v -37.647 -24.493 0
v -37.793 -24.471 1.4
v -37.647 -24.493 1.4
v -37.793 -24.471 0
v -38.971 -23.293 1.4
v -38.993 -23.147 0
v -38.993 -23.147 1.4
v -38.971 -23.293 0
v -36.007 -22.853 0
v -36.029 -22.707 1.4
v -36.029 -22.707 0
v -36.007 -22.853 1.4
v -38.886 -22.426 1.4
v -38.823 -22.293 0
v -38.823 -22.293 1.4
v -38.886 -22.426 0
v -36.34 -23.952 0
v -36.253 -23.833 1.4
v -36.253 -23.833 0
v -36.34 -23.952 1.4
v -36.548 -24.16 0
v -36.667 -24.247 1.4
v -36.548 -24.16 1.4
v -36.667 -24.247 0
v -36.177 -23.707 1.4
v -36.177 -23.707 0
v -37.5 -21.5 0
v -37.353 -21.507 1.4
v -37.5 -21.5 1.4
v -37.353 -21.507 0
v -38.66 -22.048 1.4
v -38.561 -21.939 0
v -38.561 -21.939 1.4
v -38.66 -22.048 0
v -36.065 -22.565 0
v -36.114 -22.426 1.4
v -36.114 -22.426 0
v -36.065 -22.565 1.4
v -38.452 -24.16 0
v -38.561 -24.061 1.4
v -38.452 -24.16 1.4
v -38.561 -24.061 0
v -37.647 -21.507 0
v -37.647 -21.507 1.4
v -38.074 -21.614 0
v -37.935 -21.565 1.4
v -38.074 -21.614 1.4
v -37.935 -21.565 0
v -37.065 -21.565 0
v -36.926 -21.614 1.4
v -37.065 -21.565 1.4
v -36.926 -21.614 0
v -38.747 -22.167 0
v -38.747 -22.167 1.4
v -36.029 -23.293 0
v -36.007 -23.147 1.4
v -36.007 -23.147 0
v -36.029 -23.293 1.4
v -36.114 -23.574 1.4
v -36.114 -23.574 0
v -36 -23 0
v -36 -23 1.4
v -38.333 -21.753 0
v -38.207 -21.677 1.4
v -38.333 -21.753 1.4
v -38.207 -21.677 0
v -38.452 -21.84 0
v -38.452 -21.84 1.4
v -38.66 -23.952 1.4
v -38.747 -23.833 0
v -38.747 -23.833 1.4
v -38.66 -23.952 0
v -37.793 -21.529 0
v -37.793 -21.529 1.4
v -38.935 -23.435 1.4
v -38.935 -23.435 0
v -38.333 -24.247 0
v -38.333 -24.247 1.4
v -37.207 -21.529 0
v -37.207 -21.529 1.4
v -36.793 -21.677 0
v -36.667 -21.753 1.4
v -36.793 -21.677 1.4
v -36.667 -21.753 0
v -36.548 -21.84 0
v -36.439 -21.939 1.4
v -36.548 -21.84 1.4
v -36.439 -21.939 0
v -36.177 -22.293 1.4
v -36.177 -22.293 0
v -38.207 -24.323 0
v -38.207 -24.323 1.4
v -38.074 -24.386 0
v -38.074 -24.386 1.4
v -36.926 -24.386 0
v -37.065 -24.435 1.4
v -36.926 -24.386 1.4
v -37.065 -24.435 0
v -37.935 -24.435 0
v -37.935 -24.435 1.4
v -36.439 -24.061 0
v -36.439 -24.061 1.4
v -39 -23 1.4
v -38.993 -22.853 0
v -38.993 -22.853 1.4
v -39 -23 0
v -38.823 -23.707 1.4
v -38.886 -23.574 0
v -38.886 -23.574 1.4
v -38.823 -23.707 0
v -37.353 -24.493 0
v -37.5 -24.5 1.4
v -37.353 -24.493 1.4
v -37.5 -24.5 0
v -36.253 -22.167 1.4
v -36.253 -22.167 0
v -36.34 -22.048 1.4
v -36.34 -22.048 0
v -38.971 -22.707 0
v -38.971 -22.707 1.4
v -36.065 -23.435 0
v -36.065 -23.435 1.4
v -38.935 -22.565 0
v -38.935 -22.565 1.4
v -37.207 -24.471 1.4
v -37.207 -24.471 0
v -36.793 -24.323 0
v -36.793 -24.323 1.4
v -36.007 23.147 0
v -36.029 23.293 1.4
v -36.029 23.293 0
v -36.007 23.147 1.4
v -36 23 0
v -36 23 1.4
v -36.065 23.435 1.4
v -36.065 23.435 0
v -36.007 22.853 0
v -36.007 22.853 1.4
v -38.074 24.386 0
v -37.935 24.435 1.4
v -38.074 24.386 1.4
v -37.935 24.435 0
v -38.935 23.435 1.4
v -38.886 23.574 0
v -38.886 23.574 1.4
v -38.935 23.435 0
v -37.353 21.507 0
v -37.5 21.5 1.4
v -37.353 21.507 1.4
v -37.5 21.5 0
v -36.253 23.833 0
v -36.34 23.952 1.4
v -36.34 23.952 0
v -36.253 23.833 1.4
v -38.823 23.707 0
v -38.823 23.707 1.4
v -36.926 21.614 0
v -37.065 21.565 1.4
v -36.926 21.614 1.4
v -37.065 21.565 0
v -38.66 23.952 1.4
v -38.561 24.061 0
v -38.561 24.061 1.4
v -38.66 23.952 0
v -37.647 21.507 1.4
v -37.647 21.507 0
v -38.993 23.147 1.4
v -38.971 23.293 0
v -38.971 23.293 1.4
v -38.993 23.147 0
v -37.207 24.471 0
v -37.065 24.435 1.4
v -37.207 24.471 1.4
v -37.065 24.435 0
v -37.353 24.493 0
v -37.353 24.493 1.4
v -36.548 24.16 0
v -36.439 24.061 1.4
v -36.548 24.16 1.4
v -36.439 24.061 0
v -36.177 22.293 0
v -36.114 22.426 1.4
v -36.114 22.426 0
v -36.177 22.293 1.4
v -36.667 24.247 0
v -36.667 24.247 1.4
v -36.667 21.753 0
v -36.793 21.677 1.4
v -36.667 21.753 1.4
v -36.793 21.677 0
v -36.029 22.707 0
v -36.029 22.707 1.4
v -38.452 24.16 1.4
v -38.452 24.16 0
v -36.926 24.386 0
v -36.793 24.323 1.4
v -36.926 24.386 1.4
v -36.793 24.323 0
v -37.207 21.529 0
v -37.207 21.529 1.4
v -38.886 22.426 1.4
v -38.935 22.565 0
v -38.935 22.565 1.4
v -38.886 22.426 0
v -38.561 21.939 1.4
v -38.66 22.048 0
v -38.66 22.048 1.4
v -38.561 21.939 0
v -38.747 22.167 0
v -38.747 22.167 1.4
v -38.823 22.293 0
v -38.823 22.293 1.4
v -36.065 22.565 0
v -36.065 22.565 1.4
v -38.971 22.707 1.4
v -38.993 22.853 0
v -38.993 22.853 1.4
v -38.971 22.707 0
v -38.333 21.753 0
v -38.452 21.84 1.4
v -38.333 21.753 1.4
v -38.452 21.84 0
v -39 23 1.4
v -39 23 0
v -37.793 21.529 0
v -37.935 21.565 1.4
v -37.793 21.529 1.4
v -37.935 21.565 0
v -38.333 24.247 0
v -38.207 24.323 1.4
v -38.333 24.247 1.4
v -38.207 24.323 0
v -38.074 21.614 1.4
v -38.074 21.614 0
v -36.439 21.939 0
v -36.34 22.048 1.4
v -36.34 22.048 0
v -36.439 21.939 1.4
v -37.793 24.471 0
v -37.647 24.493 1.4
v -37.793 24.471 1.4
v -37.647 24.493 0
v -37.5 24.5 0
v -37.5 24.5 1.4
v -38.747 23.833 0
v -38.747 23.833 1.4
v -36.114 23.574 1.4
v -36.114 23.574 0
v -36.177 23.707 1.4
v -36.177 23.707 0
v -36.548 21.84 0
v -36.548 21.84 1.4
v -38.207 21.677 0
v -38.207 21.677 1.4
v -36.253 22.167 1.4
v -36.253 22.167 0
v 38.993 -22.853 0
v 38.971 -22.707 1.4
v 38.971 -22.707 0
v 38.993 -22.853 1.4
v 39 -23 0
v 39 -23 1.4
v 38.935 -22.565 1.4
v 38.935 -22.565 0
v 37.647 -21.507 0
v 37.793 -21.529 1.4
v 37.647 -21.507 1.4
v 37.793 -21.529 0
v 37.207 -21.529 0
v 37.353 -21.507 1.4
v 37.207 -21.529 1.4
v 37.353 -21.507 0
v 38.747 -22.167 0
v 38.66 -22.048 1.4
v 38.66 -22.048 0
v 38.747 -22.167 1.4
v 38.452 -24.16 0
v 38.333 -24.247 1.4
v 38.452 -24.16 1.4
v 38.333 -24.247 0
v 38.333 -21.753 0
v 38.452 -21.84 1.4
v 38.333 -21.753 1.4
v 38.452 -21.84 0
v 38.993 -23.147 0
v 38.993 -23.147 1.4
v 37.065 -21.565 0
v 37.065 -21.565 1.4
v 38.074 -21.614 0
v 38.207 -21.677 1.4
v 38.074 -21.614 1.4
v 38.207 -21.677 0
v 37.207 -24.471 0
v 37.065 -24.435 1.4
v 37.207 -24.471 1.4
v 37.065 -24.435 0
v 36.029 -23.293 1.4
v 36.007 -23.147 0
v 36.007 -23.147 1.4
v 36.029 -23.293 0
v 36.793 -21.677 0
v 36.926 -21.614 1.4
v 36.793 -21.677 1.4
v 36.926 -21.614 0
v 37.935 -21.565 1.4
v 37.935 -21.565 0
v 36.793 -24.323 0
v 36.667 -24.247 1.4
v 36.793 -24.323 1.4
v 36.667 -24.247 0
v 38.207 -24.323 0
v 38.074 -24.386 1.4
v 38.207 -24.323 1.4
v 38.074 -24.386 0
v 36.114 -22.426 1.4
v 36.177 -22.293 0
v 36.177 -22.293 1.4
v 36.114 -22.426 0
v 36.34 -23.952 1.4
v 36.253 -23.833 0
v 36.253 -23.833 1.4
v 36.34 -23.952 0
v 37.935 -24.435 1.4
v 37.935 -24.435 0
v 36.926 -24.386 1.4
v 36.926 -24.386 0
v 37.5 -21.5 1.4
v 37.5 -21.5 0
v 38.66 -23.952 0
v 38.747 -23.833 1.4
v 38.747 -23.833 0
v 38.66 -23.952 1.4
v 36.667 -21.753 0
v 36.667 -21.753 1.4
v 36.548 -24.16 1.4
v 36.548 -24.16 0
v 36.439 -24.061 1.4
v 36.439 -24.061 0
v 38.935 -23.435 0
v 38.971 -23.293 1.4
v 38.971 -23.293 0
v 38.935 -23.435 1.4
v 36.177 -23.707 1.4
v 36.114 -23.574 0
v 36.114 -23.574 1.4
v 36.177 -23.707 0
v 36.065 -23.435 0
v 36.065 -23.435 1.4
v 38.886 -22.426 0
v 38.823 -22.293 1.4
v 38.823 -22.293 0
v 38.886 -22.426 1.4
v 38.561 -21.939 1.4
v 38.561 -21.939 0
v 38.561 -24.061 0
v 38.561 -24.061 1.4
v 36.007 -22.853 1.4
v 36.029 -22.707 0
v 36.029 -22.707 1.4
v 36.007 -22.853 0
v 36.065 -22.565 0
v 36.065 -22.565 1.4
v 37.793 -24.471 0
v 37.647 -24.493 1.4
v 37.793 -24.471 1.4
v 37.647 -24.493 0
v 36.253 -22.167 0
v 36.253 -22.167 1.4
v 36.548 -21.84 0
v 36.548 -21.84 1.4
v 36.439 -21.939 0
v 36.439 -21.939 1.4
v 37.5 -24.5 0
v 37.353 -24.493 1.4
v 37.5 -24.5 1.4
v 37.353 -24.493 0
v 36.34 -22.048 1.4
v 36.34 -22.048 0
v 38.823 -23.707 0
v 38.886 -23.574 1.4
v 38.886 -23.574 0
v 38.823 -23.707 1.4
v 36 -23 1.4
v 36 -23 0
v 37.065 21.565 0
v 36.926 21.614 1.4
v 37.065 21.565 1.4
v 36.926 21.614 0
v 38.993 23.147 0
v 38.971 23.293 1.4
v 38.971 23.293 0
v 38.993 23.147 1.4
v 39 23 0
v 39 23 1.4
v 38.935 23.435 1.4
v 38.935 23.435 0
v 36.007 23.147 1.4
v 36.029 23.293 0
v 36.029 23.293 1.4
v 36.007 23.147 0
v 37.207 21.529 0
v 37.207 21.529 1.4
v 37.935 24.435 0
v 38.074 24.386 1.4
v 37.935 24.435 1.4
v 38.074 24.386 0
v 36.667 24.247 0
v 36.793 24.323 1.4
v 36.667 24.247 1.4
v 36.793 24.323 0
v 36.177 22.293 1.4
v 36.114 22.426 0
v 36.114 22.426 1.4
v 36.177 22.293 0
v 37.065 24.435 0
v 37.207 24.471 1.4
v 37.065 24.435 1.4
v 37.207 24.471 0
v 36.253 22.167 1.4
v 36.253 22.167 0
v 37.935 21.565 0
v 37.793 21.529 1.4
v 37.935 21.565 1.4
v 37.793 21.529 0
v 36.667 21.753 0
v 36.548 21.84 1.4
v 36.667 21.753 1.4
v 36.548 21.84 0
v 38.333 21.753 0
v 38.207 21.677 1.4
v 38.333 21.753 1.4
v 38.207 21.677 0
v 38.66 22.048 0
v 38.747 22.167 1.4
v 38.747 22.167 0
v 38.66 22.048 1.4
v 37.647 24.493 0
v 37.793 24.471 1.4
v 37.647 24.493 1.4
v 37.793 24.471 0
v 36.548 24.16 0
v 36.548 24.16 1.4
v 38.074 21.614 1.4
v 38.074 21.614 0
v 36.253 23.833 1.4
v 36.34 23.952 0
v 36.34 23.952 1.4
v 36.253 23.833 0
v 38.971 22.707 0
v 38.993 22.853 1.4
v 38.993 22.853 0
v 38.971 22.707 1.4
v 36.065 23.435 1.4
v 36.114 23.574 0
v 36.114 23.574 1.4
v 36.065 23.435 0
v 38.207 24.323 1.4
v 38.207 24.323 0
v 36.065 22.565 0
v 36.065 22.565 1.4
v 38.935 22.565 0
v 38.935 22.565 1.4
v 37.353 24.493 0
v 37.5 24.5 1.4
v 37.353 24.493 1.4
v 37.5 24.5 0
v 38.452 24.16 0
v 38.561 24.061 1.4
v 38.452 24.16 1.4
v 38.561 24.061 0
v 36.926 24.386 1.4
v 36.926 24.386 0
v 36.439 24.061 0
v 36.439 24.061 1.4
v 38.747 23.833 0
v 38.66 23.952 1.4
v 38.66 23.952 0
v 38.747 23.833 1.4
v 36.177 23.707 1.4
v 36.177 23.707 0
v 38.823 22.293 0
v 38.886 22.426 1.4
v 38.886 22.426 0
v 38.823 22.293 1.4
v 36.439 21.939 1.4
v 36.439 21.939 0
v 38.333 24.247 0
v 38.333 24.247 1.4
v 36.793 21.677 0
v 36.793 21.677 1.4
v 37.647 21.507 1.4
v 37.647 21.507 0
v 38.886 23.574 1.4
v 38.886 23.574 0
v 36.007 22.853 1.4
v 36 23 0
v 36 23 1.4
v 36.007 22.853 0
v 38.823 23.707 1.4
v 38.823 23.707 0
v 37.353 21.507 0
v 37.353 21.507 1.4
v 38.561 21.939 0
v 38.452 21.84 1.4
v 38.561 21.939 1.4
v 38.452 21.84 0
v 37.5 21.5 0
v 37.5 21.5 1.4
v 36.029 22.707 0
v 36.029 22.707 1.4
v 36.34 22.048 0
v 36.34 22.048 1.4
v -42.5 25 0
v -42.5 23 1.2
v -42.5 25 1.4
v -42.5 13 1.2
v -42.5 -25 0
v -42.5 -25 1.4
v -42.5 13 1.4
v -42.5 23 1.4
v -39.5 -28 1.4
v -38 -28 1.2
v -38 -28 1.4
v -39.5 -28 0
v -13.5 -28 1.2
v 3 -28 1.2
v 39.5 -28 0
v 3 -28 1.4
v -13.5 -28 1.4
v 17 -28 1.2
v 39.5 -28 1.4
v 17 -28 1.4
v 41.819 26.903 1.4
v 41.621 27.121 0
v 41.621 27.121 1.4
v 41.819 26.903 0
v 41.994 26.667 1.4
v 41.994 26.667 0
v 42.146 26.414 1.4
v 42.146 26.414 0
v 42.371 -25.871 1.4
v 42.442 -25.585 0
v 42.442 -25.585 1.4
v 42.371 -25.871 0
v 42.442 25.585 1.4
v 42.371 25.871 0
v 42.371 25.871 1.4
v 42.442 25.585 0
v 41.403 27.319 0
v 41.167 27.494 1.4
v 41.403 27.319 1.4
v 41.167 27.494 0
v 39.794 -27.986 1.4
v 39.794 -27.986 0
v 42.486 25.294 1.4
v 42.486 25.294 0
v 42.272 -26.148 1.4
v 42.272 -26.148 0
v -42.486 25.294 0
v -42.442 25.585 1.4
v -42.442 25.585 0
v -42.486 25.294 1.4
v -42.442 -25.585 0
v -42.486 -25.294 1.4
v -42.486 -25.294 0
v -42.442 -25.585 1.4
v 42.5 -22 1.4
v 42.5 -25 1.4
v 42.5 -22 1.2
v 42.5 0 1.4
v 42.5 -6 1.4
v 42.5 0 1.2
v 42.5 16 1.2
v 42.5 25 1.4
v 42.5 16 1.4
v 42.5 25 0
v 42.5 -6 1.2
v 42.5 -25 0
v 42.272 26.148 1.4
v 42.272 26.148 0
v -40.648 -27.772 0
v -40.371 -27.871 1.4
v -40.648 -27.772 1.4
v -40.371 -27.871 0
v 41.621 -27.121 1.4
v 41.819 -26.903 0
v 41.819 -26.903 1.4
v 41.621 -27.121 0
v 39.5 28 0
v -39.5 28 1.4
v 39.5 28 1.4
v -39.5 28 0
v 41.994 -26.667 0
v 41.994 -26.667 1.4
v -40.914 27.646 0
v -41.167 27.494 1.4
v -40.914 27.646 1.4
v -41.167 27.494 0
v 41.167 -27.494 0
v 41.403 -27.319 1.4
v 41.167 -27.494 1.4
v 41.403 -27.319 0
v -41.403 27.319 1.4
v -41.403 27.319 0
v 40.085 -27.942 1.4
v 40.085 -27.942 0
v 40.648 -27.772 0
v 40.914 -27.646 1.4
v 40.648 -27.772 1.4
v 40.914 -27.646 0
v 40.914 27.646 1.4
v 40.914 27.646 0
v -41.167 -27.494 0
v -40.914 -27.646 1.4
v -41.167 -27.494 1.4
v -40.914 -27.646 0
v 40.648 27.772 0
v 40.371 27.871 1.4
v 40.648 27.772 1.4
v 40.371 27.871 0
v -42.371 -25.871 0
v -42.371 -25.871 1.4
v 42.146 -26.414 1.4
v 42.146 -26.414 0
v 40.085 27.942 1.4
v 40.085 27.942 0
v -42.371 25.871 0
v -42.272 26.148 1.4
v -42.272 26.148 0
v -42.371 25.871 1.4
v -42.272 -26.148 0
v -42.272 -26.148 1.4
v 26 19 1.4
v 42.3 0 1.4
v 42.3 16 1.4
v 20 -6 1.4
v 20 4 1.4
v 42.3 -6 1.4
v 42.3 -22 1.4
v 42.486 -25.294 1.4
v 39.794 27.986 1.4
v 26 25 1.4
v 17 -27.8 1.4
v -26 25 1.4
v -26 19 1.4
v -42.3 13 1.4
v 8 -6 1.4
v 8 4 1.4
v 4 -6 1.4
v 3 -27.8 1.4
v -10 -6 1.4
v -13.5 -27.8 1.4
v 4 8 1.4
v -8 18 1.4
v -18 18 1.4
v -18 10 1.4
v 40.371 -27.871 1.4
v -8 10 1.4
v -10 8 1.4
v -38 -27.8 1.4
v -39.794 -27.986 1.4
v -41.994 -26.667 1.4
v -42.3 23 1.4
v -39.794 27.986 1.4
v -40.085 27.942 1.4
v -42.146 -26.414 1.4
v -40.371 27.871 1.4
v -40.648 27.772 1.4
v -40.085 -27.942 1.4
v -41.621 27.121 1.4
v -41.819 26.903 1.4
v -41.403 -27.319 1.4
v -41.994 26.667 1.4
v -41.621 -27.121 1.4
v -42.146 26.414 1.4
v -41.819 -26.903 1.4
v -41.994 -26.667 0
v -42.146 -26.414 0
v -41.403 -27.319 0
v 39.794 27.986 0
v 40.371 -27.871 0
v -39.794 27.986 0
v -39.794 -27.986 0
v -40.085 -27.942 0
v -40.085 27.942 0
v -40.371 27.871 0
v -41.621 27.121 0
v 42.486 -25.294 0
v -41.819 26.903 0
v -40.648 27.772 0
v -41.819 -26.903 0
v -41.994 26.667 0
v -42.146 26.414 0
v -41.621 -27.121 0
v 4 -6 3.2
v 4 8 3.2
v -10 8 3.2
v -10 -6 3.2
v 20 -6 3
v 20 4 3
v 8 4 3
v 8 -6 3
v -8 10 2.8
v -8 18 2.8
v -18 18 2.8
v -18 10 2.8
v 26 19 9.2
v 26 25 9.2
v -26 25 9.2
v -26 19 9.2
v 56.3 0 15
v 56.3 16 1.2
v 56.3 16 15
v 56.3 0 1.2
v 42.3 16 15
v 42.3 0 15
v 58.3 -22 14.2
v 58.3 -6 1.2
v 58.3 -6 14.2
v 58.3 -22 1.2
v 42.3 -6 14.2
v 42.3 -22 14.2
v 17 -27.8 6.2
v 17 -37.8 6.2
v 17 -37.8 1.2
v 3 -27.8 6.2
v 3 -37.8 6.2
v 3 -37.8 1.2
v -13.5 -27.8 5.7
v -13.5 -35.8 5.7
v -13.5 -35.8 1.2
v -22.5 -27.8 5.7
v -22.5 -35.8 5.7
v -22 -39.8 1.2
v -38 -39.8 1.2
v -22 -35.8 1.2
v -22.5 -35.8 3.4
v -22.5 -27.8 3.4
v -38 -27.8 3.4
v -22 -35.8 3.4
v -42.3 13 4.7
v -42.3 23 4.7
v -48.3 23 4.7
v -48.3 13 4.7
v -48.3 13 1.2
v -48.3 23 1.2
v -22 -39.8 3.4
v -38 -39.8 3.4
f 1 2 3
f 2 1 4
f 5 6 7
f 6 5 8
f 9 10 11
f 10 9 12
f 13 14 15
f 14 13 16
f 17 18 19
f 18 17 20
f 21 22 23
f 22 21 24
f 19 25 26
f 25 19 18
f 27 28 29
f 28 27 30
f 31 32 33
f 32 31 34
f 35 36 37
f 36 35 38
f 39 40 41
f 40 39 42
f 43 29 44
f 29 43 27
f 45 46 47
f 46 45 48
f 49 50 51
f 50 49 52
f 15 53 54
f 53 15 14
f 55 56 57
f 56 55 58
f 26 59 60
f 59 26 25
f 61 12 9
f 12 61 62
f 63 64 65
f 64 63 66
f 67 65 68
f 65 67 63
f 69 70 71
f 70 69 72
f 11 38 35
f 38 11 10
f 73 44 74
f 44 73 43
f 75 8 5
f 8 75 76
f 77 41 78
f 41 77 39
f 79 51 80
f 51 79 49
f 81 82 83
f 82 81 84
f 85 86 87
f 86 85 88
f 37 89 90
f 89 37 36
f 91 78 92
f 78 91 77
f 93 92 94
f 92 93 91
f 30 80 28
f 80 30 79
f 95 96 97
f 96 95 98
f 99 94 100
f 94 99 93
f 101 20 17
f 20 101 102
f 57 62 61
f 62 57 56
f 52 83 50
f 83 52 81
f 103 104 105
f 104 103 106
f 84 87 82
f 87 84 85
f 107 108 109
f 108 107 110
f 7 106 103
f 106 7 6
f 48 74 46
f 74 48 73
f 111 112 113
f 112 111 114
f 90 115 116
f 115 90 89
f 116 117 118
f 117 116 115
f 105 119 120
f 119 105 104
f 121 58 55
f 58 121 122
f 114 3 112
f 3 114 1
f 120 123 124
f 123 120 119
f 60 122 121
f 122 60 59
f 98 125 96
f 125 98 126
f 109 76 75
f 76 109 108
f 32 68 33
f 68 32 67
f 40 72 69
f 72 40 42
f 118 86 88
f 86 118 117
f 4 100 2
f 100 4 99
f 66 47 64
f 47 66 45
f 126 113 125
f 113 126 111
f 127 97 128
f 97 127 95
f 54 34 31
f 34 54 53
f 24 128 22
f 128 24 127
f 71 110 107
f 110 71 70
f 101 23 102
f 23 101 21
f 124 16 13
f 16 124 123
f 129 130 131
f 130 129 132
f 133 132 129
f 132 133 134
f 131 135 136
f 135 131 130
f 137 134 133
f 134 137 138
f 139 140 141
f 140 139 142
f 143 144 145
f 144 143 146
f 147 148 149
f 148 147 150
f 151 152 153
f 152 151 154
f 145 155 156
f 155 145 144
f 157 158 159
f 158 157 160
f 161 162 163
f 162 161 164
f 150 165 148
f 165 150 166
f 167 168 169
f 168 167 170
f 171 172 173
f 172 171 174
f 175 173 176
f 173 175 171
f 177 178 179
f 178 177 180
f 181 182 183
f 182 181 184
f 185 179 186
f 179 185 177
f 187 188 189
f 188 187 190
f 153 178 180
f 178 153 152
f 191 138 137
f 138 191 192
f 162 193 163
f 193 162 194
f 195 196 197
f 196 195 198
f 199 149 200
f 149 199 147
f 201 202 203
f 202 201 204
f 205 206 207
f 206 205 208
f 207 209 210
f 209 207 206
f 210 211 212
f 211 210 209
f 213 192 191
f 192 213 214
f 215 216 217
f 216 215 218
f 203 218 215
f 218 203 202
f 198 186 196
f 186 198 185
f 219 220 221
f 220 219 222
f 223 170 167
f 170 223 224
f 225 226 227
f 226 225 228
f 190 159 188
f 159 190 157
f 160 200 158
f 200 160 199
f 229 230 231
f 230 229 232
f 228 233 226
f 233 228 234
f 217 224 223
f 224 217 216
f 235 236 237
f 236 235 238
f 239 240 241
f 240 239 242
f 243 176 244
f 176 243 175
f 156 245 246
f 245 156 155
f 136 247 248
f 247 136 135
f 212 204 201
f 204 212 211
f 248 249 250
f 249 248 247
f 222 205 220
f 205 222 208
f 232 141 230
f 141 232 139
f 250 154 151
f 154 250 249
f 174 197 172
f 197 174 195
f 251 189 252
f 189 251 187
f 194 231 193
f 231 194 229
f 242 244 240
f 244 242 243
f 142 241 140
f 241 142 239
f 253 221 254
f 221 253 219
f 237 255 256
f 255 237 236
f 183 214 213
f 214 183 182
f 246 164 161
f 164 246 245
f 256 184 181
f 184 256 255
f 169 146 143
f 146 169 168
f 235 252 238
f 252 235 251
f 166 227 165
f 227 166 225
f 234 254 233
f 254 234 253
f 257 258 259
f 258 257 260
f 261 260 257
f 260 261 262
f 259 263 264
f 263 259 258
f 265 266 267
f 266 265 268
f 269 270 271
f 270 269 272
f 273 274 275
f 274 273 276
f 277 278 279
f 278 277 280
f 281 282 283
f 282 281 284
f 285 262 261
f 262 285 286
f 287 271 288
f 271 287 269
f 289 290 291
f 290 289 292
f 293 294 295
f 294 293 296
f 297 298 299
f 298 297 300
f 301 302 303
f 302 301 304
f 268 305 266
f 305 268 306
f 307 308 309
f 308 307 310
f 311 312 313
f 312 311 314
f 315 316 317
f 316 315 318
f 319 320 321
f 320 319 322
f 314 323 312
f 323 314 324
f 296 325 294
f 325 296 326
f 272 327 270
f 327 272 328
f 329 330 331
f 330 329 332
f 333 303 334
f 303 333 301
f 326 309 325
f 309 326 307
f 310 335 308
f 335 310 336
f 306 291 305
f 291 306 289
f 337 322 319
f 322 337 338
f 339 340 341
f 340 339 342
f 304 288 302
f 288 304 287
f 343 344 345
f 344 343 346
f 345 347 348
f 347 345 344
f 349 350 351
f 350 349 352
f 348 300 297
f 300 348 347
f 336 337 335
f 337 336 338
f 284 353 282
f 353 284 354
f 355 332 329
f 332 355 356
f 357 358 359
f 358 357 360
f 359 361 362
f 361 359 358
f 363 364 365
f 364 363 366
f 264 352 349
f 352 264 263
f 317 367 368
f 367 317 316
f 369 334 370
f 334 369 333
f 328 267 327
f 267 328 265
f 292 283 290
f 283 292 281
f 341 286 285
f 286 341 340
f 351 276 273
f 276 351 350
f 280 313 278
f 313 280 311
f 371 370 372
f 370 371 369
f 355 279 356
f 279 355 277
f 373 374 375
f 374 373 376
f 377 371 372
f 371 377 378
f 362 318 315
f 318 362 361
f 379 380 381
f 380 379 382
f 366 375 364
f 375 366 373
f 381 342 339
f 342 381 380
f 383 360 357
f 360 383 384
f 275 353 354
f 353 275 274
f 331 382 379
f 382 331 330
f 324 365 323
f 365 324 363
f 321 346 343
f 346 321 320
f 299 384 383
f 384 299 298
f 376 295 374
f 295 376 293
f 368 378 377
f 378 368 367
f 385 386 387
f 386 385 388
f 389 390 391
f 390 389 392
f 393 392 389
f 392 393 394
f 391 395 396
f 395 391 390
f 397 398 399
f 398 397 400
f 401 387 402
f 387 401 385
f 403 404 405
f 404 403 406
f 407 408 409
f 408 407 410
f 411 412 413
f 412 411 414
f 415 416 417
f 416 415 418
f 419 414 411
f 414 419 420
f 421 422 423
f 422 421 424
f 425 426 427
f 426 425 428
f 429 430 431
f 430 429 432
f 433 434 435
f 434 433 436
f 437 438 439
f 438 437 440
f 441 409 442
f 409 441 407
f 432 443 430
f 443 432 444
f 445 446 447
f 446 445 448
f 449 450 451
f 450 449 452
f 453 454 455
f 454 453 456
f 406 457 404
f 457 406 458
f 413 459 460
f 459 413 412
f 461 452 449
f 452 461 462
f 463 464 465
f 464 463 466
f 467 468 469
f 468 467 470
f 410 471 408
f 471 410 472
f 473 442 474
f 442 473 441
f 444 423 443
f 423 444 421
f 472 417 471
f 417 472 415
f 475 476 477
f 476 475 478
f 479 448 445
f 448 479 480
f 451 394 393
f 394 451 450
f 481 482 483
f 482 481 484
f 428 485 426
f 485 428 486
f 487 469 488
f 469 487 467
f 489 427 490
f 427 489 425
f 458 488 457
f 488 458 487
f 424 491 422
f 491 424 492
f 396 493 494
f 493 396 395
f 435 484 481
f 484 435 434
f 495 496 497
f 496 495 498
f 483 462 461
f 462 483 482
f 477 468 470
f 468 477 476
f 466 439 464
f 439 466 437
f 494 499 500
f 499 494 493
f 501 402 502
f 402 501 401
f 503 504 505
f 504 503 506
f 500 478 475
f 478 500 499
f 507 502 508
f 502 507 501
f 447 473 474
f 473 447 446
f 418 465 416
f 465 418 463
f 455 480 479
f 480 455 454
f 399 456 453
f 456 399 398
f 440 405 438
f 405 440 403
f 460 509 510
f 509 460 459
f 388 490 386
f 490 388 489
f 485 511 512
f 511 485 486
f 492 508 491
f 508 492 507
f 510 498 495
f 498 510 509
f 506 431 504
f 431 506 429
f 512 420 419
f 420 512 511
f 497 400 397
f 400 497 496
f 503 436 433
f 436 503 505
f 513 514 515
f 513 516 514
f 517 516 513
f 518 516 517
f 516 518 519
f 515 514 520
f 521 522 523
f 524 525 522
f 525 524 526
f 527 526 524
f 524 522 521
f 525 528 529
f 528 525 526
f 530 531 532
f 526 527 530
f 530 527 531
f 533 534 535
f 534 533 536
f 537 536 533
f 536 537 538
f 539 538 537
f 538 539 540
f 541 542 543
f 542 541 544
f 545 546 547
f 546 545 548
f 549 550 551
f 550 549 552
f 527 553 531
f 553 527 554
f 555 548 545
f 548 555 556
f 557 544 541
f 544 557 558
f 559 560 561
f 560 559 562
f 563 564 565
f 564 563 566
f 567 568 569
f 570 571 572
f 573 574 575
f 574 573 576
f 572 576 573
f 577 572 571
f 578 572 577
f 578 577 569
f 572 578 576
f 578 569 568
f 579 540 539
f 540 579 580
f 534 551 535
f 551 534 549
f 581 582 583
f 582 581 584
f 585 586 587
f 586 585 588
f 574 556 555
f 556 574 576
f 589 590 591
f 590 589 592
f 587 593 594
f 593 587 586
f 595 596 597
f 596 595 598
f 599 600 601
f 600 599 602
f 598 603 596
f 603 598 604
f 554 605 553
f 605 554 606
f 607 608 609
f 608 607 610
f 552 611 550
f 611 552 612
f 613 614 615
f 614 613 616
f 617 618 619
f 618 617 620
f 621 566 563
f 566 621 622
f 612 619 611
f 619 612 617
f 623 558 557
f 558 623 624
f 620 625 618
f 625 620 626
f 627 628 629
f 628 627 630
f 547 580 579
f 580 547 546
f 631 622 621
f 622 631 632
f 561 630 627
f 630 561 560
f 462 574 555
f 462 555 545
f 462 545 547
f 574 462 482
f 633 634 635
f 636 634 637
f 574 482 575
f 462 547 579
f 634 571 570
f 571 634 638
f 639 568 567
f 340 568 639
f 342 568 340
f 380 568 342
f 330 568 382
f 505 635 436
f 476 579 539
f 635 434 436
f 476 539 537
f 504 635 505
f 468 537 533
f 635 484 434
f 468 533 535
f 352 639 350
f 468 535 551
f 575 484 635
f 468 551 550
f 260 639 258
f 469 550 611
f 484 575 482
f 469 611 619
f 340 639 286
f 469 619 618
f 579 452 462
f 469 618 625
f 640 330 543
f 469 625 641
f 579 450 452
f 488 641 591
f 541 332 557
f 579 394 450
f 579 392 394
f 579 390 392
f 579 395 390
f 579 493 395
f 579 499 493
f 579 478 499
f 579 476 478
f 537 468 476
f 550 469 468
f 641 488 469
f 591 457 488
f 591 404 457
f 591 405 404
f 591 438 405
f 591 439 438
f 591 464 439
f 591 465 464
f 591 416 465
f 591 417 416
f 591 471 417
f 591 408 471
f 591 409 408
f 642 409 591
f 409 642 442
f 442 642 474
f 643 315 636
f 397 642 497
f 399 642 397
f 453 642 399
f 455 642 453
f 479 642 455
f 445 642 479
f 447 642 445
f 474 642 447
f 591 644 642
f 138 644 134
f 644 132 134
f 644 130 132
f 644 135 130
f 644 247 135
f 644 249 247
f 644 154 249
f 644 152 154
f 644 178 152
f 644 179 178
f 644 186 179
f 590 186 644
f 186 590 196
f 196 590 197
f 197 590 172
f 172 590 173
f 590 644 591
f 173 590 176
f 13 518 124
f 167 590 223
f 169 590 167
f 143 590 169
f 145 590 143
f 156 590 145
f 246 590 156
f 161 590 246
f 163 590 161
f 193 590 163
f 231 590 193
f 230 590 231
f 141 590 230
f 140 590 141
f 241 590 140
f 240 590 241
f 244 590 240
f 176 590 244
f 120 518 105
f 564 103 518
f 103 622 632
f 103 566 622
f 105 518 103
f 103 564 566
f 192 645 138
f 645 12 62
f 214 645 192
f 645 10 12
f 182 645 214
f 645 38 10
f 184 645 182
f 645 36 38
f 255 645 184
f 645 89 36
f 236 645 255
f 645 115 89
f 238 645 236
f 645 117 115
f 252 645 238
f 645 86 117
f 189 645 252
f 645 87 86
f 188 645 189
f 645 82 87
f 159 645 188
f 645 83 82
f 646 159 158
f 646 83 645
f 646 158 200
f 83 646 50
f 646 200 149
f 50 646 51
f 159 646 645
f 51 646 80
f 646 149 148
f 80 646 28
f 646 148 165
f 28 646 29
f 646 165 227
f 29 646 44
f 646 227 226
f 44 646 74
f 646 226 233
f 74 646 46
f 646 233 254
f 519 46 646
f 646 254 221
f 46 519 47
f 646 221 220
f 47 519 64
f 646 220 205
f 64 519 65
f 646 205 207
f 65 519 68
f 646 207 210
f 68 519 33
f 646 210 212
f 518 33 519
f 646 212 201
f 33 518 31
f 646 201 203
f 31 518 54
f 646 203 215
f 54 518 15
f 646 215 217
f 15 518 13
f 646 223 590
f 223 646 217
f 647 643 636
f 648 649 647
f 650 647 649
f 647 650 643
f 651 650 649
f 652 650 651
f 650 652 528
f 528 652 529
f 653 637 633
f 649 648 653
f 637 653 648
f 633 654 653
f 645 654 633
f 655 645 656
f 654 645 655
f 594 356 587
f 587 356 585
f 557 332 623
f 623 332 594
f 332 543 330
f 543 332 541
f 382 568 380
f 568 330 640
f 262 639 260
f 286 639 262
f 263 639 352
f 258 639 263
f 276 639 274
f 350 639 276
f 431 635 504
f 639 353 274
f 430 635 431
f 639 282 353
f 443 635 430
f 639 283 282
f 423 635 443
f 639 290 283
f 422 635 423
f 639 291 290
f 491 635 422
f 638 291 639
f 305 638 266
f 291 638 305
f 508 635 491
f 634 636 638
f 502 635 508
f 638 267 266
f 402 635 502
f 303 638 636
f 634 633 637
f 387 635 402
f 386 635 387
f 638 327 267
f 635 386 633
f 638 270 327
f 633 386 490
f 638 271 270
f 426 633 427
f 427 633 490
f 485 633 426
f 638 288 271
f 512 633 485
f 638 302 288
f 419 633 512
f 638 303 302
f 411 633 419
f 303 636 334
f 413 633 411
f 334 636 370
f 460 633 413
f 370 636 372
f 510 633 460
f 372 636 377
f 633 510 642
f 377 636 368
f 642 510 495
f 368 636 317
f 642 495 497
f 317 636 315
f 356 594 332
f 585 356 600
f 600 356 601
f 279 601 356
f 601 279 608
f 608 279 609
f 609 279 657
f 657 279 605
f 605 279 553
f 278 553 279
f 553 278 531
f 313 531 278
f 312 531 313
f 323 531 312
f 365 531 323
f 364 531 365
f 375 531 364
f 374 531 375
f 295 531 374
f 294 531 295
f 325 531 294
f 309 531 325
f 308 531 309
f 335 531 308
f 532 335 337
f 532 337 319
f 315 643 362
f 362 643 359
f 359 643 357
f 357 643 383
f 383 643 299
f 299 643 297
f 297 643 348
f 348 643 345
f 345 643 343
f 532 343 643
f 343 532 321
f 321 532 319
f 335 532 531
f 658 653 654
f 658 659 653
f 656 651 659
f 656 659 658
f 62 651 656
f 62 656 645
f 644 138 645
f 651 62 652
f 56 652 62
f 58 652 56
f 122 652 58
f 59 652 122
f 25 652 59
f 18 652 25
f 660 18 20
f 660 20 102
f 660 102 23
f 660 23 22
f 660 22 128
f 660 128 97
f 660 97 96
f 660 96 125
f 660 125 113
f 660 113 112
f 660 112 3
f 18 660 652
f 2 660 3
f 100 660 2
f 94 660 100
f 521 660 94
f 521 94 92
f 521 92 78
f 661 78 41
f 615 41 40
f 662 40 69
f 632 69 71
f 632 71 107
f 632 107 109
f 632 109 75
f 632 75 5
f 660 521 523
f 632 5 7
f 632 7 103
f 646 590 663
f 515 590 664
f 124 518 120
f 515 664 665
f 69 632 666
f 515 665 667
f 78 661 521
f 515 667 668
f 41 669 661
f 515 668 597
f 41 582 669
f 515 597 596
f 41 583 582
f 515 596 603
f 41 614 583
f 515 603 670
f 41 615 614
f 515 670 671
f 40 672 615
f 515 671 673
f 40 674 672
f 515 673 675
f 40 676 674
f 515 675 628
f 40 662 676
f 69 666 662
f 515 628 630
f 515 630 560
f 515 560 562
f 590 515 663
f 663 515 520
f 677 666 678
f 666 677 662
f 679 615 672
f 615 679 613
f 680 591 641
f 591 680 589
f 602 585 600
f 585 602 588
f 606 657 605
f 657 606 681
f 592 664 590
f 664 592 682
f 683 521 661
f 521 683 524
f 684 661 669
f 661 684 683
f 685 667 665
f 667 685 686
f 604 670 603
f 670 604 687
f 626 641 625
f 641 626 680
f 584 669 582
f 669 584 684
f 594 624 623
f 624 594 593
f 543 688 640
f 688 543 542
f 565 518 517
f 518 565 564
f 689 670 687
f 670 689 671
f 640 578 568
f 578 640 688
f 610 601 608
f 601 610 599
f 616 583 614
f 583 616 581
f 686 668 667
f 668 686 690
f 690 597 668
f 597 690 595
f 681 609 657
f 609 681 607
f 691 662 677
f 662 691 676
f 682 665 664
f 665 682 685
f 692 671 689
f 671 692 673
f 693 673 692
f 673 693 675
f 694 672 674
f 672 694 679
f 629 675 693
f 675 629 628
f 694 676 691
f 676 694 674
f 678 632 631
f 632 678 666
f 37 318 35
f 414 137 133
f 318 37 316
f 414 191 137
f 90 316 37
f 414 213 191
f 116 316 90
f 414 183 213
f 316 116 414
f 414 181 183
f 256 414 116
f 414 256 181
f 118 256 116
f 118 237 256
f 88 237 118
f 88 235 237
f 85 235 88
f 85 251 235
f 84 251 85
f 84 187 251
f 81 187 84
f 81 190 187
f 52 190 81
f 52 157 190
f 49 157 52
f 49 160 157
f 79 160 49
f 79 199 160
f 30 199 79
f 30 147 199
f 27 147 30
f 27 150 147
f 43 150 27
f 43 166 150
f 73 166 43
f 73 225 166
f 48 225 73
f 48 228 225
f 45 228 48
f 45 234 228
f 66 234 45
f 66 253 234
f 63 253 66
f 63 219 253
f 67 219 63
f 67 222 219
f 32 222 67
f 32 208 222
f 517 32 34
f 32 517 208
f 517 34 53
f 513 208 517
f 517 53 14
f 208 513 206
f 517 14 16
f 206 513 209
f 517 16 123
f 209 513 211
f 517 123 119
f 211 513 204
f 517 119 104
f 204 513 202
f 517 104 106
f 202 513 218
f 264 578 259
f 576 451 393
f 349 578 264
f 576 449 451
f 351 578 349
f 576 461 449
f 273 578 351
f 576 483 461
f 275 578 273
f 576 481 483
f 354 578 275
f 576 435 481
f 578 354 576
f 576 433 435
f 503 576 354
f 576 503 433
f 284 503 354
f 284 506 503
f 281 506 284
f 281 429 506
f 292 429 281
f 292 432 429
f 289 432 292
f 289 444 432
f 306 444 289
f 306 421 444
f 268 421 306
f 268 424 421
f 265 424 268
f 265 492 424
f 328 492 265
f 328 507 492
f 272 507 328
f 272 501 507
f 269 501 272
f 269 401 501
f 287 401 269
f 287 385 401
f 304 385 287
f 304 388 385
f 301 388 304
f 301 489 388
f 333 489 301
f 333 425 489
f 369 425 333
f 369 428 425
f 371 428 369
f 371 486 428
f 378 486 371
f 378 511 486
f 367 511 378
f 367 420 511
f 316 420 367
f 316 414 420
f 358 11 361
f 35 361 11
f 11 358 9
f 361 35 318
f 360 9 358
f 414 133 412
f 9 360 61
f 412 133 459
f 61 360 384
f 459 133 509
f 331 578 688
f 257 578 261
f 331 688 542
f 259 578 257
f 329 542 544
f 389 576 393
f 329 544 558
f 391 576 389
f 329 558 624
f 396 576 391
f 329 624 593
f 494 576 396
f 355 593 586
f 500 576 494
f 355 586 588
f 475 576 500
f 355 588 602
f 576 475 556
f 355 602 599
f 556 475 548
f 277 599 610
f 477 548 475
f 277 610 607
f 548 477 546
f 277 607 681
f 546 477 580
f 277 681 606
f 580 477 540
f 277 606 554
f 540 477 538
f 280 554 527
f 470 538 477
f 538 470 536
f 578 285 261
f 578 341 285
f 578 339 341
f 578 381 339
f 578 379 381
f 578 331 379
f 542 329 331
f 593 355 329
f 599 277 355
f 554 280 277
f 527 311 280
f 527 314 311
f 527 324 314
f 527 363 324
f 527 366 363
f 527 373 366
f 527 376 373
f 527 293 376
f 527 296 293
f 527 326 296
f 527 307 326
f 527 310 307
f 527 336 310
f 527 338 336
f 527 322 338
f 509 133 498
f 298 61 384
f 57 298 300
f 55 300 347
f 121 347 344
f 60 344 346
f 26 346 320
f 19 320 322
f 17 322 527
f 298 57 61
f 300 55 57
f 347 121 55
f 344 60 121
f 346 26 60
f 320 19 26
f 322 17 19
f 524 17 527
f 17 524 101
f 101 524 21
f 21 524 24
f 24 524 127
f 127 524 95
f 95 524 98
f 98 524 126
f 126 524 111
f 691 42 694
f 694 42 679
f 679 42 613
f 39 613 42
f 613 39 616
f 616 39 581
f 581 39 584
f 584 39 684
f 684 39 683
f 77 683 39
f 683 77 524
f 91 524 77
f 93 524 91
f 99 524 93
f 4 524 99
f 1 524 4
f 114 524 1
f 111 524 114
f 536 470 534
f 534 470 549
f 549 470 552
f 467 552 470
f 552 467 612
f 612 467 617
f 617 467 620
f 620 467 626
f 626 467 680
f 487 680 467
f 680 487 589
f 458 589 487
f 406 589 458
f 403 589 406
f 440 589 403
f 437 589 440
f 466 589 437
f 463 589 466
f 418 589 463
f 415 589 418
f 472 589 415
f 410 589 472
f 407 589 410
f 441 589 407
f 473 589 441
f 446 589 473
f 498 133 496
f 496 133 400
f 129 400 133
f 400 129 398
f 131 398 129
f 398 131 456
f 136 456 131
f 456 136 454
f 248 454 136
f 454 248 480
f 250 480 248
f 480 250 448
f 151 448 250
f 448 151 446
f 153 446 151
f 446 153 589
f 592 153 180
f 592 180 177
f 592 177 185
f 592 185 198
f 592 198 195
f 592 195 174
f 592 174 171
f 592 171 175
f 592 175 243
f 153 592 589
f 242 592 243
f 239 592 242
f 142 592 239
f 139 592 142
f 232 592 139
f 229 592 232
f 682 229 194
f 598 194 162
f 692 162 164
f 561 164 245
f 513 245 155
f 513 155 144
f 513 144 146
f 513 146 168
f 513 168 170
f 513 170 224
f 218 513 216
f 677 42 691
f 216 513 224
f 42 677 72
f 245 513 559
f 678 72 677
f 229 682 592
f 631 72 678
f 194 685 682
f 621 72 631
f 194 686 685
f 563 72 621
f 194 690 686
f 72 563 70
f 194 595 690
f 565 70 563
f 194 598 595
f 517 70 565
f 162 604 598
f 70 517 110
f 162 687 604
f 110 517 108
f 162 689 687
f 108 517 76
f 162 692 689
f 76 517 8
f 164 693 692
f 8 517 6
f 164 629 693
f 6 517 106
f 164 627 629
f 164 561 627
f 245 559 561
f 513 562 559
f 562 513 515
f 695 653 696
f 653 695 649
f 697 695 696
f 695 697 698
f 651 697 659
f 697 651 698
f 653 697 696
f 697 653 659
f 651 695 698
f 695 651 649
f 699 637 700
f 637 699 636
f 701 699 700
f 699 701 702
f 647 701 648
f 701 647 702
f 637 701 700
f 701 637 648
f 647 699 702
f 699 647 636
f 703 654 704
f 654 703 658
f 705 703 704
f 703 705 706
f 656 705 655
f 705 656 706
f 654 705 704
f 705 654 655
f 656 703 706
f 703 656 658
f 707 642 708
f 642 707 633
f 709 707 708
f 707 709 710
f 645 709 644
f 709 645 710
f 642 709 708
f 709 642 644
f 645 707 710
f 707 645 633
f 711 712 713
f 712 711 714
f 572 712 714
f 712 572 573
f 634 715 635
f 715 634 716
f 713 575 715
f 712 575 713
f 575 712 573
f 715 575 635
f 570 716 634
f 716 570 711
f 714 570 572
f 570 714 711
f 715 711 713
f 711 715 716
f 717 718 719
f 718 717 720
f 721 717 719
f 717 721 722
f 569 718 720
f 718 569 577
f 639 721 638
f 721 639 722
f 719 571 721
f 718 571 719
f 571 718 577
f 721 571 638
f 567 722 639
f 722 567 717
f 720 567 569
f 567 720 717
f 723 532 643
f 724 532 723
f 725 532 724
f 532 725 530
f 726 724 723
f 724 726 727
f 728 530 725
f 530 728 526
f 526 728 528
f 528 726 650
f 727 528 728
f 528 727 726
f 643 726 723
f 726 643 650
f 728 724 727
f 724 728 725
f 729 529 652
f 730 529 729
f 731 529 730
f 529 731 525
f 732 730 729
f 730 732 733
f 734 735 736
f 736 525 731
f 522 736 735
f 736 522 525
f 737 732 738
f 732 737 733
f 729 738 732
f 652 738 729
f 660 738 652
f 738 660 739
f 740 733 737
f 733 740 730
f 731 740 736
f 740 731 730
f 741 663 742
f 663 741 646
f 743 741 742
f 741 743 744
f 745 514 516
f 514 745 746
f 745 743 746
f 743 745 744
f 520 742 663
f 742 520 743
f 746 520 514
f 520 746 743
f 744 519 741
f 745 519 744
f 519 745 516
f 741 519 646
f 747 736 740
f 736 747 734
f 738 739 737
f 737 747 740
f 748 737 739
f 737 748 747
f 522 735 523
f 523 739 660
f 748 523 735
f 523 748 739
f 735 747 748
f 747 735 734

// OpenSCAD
$fn = 64;

// =====================
// Parameters (mm)
// =====================
pcb_length = 85.0;
pcb_width  = 56.0;
pcb_thickness = 1.4;

fillet_radius = 3.0;

mounting_hole_diameter = 3.0;
mounting_hole_offset_x = 5.0;
mounting_hole_offset_y = 5.0;

// Small overlap to guarantee watertight unions
eps = 0.2;

// =====================
// Helpers
// =====================
module rounded_plate_xy(l, w, h, r) {
    // Centered at origin, Z from 0..h
    hull() {
        translate([-(l/2 - r), -(w/2 - r), 0]) cylinder(h=h, r=r);
        translate([ (l/2 - r), -(w/2 - r), 0]) cylinder(h=h, r=r);
        translate([-(l/2 - r),  (w/2 - r), 0]) cylinder(h=h, r=r);
        translate([ (l/2 - r),  (w/2 - r), 0]) cylinder(h=h, r=r);
    }
}

module mounting_holes_cut() {
    // Through-holes, centered board coordinates
    for (sx = [-1, 1])
        for (sy = [-1, 1])
            translate([sx*(pcb_length/2 - mounting_hole_offset_x),
                       sy*(pcb_width/2  - mounting_hole_offset_y),
                       -eps])
                cylinder(h=pcb_thickness + 2*eps, d=mounting_hole_diameter);
}

// Simple component primitives (all placed to TOUCH/OVERLAP the PCB)
module chip(x, y, lx, wy, hz) {
    translate([x, y, pcb_thickness - eps])
        cube([lx, wy, hz], center=false);
}

module header_pinblock(x, y, lx, wy, hz) {
    translate([x, y, pcb_thickness - eps])
        cube([lx, wy, hz], center=false);
}

module side_connector_on_edge(edge="right", y_center=0, conn_w=16, conn_d=14, conn_h=12) {
    // Connector protrudes outward from PCB edge, but overlaps into PCB by eps
    // conn_w along Y, conn_d along X (outward), conn_h along Z
    if (edge == "right") {
        translate([ pcb_length/2 - eps, y_center - conn_w/2, pcb_thickness - eps])
            cube([conn_d, conn_w, conn_h], center=false);
    } else if (edge == "left") {
        translate([-(pcb_length/2 + conn_d - eps), y_center - conn_w/2, pcb_thickness - eps])
            cube([conn_d, conn_w, conn_h], center=false);
    } else if (edge == "top") { // +Y edge
        translate([x_center - conn_w/2, pcb_width/2 - eps, pcb_thickness - eps])
            cube([conn_w, conn_d, conn_h], center=false);
    } else if (edge == "bottom") { // -Y edge
        translate([x_center - conn_w/2, -(pcb_width/2 + conn_d - eps), pcb_thickness - eps])
            cube([conn_w, conn_d, conn_h], center=false);
    }
}

// =====================
// Main PCB body
// =====================
module pcb_body() {
    difference() {
        rounded_plate_xy(pcb_length, pcb_width, pcb_thickness, fillet_radius);
        mounting_holes_cut();
    }
}

// =====================
// Components (kept simple but recognizable)
// All components are UNIONED with PCB to ensure ONE connected solid.
// =====================
module components() {
    // Large SoC
    chip(-10, -6, 14, 14, 2.0);

    // RAM / secondary chip
    chip(8, -6, 12, 10, 1.8);

    // Power management
    chip(-18, 10, 10, 8, 1.6);

    // 40-pin header block along top edge (inside board)
    header_len = 52;
    header_w   = 6;
    header_h   = 8;
    translate([-(header_len/2), pcb_width/2 - header_w - 3, pcb_thickness - eps])
        cube([header_len, header_w, header_h], center=false);

    // USB-like stacked connector on right edge
    // Two stacked blocks to suggest dual ports
    usb_w = 16;
    usb_d = 14;
    usb_h = 7;
    y_usb = 8;
    translate([pcb_length/2 - eps, y_usb - usb_w/2, pcb_thickness - eps])
        cube([usb_d, usb_w, usb_h], center=false);
    translate([pcb_length/2 - eps, y_usb - usb_w/2, pcb_thickness - eps + usb_h - eps])
        cube([usb_d, usb_w, usb_h], center=false);

    // Ethernet-like connector on right edge below USB
    eth_w = 16;
    eth_d = 16;
    eth_h = 13;
    y_eth = -14;
    translate([pcb_length/2 - eps, y_eth - eth_w/2, pcb_thickness - eps])
        cube([eth_d, eth_w, eth_h], center=false);

    // HDMI-like connector on bottom edge (protrudes -Y)
    hdmi_w = 14;   // along X
    hdmi_d = 10;   // outward along Y
    hdmi_h = 5;
    x_hdmi = 10;
    translate([x_hdmi - hdmi_w/2, -(pcb_width/2 + hdmi_d - eps), pcb_thickness - eps])
        cube([hdmi_w, hdmi_d, hdmi_h], center=false);

    // USB-C / power connector on bottom edge
    pwr_w = 9;
    pwr_d = 8;
    pwr_h = 4.5;
    x_pwr = -18;
    translate([x_pwr - pwr_w/2, -(pcb_width/2 + pwr_d - eps), pcb_thickness - eps])
        cube([pwr_w, pwr_d, pwr_h], center=false);

    // Camera/Display FFC connector on left edge
    ffc_w = 10;  // along Y
    ffc_d = 6;   // outward along X
    ffc_h = 3.5;
    y_ffc = 18;
    translate([-(pcb_length/2 + ffc_d - eps), y_ffc - ffc_w/2, pcb_thickness - eps])
        cube([ffc_d, ffc_w, ffc_h], center=false);

    // MicroSD-like slot on bottom side (as a shallow protrusion)
    sd_w = 16; // along X
    sd_d = 12; // along Y outward (-Y)
    sd_h = 2.2;
    x_sd = -30;
    translate([x_sd - sd_w/2, -(pcb_width/2 + sd_d - eps), pcb_thickness - eps])
        cube([sd_w, sd_d, sd_h], center=false);
}

// =====================
// Assemble: ONE connected solid
// =====================
union() {
    pcb_body();
    components();
}
